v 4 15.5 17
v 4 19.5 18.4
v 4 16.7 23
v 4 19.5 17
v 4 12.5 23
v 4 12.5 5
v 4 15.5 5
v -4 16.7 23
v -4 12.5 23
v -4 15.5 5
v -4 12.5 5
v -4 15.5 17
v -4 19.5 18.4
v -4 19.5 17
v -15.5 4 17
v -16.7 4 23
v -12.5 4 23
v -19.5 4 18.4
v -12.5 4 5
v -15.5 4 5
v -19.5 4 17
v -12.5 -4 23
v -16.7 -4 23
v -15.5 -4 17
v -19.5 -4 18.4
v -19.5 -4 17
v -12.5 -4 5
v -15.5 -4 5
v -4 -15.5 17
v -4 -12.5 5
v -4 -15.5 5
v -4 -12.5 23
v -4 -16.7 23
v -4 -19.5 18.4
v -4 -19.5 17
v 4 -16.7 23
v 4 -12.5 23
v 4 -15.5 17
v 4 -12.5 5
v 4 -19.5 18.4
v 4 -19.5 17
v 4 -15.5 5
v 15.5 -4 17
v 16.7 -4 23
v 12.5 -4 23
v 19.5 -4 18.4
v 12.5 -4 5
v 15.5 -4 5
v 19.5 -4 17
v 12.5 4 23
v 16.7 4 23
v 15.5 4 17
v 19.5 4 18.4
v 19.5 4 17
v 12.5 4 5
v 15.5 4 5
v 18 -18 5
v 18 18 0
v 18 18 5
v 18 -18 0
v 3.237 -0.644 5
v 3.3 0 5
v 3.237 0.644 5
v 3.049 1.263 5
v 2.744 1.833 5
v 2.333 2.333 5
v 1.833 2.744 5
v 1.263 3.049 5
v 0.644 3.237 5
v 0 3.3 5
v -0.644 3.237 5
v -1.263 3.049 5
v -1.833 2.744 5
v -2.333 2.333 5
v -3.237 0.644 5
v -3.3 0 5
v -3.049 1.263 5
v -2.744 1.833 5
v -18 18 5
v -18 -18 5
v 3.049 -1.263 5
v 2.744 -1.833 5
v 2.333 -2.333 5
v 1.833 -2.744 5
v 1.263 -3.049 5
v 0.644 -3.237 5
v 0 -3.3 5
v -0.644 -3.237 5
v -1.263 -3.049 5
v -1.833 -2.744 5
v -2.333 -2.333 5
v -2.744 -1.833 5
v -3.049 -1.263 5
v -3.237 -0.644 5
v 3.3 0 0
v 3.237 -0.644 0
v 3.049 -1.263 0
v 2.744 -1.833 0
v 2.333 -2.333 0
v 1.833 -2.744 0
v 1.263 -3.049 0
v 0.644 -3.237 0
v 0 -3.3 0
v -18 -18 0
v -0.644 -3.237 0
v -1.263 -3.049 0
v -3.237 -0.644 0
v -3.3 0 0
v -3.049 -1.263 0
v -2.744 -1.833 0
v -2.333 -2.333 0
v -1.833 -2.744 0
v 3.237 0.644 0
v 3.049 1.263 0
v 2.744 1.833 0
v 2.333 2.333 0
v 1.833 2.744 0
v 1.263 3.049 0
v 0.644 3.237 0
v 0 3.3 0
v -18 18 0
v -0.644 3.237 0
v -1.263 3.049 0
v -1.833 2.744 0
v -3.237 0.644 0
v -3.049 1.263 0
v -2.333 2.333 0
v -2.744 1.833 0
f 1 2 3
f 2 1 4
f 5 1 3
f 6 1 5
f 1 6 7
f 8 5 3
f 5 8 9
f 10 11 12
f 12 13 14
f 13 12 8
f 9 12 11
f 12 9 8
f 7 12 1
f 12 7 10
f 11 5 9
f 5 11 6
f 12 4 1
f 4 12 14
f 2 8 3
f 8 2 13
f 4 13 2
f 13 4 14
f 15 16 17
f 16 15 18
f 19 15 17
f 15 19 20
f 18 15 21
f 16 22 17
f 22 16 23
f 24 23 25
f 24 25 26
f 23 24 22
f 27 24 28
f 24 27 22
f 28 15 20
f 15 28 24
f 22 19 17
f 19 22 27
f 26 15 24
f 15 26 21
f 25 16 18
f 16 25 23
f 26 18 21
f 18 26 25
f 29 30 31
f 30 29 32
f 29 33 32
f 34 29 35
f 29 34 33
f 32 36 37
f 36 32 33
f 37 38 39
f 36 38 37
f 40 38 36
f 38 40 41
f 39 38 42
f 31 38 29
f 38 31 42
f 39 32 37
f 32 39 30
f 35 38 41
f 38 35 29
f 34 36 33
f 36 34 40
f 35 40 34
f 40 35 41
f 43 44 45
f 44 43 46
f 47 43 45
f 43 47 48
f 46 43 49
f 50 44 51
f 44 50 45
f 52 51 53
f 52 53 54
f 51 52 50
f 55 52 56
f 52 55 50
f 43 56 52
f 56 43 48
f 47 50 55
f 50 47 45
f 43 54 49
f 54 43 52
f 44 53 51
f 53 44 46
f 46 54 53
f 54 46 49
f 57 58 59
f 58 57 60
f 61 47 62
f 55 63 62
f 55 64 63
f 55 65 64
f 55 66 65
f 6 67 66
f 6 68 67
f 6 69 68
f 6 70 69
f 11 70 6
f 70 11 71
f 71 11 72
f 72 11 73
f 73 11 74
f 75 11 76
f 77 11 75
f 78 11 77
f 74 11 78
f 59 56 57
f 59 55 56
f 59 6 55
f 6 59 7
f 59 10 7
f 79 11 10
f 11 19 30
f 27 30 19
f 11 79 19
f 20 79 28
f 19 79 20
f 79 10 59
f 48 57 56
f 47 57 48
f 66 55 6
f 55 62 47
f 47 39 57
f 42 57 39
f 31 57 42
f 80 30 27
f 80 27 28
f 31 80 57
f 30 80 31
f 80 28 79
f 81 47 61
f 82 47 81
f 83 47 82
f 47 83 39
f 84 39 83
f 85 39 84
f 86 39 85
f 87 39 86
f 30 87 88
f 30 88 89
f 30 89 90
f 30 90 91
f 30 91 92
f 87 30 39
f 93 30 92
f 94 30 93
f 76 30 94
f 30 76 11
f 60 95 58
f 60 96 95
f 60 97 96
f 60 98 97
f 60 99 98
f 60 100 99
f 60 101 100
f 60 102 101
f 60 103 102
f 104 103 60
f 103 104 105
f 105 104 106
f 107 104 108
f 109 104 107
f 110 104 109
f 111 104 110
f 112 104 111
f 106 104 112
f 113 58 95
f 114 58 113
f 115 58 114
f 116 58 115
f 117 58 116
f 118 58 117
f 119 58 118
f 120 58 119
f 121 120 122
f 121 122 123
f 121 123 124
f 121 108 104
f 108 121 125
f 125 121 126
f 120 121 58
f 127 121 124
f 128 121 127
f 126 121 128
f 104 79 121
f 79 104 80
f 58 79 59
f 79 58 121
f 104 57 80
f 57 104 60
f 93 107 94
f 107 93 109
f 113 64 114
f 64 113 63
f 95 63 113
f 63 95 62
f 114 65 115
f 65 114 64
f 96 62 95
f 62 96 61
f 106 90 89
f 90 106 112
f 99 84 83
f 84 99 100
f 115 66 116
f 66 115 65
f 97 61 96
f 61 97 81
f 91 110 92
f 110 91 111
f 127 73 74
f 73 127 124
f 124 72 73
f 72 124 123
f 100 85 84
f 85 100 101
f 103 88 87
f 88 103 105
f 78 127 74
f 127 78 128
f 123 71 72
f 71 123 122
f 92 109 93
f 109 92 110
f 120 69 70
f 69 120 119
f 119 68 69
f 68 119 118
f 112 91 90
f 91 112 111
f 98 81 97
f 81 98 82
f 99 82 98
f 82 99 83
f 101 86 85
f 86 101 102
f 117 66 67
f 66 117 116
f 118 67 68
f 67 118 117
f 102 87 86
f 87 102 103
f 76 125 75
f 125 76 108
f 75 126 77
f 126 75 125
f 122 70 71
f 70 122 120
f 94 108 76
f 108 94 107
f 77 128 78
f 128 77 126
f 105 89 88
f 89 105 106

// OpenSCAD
$fn = 32;

// ----------------------------------------------------------------------
// Snap-fit latch: 4 arms, 18 mm tall, 4.2 mm undercut hooks
// ----------------------------------------------------------------------

// --- parameters (mm) ---
base_d = 36;              // base plate depth
base_h = 5;               // base plate thickness
span = 28;                // distance between opposite arms
arm_t = 3;                // arm thickness
arm_d = 8;                // arm width
height = 18;              // free arm length
head_len = 4.2;           // hook reach
head_h = 6;               // hook height
lead = 1.4;               // lead-in ramp thickness
bore_d = 6.6;             // base fixing bore
top_z = 23;               // height of the arm tips above the base

arms = 4;

difference() {
  union() {
    /* base plate, centred on the arm ring */
    translate([-18, -18, 0]) cube([base_d, base_d, base_h]);
    for (a = [0 : 360 / arms : 359]) rotate([0, 0, a]) {
    /* arm, sunk 0.5 mm into the base */
    translate([-arm_d / 2, span / 2 - arm_t / 2, base_h - 0.5]) cube([arm_d, arm_t, height + 0.5]);
    /* hook: a convex hull of a tall inner block and a thin outer lip
       gives a flat undercut below and a lead-in ramp on top */
    hull() {
      translate([-arm_d / 2, span / 2 + arm_t / 2 - 0.6, top_z - head_h]) cube([arm_d, lead + 0.4, head_h]);
      translate([-arm_d / 2, span / 2 + arm_t / 2 - 0.2, top_z - head_h]) cube([arm_d, head_len, lead]);
    }
    }
  }
  translate([0, 0, -2.5]) cylinder(h = base_h + 5, d = bore_d);
}
